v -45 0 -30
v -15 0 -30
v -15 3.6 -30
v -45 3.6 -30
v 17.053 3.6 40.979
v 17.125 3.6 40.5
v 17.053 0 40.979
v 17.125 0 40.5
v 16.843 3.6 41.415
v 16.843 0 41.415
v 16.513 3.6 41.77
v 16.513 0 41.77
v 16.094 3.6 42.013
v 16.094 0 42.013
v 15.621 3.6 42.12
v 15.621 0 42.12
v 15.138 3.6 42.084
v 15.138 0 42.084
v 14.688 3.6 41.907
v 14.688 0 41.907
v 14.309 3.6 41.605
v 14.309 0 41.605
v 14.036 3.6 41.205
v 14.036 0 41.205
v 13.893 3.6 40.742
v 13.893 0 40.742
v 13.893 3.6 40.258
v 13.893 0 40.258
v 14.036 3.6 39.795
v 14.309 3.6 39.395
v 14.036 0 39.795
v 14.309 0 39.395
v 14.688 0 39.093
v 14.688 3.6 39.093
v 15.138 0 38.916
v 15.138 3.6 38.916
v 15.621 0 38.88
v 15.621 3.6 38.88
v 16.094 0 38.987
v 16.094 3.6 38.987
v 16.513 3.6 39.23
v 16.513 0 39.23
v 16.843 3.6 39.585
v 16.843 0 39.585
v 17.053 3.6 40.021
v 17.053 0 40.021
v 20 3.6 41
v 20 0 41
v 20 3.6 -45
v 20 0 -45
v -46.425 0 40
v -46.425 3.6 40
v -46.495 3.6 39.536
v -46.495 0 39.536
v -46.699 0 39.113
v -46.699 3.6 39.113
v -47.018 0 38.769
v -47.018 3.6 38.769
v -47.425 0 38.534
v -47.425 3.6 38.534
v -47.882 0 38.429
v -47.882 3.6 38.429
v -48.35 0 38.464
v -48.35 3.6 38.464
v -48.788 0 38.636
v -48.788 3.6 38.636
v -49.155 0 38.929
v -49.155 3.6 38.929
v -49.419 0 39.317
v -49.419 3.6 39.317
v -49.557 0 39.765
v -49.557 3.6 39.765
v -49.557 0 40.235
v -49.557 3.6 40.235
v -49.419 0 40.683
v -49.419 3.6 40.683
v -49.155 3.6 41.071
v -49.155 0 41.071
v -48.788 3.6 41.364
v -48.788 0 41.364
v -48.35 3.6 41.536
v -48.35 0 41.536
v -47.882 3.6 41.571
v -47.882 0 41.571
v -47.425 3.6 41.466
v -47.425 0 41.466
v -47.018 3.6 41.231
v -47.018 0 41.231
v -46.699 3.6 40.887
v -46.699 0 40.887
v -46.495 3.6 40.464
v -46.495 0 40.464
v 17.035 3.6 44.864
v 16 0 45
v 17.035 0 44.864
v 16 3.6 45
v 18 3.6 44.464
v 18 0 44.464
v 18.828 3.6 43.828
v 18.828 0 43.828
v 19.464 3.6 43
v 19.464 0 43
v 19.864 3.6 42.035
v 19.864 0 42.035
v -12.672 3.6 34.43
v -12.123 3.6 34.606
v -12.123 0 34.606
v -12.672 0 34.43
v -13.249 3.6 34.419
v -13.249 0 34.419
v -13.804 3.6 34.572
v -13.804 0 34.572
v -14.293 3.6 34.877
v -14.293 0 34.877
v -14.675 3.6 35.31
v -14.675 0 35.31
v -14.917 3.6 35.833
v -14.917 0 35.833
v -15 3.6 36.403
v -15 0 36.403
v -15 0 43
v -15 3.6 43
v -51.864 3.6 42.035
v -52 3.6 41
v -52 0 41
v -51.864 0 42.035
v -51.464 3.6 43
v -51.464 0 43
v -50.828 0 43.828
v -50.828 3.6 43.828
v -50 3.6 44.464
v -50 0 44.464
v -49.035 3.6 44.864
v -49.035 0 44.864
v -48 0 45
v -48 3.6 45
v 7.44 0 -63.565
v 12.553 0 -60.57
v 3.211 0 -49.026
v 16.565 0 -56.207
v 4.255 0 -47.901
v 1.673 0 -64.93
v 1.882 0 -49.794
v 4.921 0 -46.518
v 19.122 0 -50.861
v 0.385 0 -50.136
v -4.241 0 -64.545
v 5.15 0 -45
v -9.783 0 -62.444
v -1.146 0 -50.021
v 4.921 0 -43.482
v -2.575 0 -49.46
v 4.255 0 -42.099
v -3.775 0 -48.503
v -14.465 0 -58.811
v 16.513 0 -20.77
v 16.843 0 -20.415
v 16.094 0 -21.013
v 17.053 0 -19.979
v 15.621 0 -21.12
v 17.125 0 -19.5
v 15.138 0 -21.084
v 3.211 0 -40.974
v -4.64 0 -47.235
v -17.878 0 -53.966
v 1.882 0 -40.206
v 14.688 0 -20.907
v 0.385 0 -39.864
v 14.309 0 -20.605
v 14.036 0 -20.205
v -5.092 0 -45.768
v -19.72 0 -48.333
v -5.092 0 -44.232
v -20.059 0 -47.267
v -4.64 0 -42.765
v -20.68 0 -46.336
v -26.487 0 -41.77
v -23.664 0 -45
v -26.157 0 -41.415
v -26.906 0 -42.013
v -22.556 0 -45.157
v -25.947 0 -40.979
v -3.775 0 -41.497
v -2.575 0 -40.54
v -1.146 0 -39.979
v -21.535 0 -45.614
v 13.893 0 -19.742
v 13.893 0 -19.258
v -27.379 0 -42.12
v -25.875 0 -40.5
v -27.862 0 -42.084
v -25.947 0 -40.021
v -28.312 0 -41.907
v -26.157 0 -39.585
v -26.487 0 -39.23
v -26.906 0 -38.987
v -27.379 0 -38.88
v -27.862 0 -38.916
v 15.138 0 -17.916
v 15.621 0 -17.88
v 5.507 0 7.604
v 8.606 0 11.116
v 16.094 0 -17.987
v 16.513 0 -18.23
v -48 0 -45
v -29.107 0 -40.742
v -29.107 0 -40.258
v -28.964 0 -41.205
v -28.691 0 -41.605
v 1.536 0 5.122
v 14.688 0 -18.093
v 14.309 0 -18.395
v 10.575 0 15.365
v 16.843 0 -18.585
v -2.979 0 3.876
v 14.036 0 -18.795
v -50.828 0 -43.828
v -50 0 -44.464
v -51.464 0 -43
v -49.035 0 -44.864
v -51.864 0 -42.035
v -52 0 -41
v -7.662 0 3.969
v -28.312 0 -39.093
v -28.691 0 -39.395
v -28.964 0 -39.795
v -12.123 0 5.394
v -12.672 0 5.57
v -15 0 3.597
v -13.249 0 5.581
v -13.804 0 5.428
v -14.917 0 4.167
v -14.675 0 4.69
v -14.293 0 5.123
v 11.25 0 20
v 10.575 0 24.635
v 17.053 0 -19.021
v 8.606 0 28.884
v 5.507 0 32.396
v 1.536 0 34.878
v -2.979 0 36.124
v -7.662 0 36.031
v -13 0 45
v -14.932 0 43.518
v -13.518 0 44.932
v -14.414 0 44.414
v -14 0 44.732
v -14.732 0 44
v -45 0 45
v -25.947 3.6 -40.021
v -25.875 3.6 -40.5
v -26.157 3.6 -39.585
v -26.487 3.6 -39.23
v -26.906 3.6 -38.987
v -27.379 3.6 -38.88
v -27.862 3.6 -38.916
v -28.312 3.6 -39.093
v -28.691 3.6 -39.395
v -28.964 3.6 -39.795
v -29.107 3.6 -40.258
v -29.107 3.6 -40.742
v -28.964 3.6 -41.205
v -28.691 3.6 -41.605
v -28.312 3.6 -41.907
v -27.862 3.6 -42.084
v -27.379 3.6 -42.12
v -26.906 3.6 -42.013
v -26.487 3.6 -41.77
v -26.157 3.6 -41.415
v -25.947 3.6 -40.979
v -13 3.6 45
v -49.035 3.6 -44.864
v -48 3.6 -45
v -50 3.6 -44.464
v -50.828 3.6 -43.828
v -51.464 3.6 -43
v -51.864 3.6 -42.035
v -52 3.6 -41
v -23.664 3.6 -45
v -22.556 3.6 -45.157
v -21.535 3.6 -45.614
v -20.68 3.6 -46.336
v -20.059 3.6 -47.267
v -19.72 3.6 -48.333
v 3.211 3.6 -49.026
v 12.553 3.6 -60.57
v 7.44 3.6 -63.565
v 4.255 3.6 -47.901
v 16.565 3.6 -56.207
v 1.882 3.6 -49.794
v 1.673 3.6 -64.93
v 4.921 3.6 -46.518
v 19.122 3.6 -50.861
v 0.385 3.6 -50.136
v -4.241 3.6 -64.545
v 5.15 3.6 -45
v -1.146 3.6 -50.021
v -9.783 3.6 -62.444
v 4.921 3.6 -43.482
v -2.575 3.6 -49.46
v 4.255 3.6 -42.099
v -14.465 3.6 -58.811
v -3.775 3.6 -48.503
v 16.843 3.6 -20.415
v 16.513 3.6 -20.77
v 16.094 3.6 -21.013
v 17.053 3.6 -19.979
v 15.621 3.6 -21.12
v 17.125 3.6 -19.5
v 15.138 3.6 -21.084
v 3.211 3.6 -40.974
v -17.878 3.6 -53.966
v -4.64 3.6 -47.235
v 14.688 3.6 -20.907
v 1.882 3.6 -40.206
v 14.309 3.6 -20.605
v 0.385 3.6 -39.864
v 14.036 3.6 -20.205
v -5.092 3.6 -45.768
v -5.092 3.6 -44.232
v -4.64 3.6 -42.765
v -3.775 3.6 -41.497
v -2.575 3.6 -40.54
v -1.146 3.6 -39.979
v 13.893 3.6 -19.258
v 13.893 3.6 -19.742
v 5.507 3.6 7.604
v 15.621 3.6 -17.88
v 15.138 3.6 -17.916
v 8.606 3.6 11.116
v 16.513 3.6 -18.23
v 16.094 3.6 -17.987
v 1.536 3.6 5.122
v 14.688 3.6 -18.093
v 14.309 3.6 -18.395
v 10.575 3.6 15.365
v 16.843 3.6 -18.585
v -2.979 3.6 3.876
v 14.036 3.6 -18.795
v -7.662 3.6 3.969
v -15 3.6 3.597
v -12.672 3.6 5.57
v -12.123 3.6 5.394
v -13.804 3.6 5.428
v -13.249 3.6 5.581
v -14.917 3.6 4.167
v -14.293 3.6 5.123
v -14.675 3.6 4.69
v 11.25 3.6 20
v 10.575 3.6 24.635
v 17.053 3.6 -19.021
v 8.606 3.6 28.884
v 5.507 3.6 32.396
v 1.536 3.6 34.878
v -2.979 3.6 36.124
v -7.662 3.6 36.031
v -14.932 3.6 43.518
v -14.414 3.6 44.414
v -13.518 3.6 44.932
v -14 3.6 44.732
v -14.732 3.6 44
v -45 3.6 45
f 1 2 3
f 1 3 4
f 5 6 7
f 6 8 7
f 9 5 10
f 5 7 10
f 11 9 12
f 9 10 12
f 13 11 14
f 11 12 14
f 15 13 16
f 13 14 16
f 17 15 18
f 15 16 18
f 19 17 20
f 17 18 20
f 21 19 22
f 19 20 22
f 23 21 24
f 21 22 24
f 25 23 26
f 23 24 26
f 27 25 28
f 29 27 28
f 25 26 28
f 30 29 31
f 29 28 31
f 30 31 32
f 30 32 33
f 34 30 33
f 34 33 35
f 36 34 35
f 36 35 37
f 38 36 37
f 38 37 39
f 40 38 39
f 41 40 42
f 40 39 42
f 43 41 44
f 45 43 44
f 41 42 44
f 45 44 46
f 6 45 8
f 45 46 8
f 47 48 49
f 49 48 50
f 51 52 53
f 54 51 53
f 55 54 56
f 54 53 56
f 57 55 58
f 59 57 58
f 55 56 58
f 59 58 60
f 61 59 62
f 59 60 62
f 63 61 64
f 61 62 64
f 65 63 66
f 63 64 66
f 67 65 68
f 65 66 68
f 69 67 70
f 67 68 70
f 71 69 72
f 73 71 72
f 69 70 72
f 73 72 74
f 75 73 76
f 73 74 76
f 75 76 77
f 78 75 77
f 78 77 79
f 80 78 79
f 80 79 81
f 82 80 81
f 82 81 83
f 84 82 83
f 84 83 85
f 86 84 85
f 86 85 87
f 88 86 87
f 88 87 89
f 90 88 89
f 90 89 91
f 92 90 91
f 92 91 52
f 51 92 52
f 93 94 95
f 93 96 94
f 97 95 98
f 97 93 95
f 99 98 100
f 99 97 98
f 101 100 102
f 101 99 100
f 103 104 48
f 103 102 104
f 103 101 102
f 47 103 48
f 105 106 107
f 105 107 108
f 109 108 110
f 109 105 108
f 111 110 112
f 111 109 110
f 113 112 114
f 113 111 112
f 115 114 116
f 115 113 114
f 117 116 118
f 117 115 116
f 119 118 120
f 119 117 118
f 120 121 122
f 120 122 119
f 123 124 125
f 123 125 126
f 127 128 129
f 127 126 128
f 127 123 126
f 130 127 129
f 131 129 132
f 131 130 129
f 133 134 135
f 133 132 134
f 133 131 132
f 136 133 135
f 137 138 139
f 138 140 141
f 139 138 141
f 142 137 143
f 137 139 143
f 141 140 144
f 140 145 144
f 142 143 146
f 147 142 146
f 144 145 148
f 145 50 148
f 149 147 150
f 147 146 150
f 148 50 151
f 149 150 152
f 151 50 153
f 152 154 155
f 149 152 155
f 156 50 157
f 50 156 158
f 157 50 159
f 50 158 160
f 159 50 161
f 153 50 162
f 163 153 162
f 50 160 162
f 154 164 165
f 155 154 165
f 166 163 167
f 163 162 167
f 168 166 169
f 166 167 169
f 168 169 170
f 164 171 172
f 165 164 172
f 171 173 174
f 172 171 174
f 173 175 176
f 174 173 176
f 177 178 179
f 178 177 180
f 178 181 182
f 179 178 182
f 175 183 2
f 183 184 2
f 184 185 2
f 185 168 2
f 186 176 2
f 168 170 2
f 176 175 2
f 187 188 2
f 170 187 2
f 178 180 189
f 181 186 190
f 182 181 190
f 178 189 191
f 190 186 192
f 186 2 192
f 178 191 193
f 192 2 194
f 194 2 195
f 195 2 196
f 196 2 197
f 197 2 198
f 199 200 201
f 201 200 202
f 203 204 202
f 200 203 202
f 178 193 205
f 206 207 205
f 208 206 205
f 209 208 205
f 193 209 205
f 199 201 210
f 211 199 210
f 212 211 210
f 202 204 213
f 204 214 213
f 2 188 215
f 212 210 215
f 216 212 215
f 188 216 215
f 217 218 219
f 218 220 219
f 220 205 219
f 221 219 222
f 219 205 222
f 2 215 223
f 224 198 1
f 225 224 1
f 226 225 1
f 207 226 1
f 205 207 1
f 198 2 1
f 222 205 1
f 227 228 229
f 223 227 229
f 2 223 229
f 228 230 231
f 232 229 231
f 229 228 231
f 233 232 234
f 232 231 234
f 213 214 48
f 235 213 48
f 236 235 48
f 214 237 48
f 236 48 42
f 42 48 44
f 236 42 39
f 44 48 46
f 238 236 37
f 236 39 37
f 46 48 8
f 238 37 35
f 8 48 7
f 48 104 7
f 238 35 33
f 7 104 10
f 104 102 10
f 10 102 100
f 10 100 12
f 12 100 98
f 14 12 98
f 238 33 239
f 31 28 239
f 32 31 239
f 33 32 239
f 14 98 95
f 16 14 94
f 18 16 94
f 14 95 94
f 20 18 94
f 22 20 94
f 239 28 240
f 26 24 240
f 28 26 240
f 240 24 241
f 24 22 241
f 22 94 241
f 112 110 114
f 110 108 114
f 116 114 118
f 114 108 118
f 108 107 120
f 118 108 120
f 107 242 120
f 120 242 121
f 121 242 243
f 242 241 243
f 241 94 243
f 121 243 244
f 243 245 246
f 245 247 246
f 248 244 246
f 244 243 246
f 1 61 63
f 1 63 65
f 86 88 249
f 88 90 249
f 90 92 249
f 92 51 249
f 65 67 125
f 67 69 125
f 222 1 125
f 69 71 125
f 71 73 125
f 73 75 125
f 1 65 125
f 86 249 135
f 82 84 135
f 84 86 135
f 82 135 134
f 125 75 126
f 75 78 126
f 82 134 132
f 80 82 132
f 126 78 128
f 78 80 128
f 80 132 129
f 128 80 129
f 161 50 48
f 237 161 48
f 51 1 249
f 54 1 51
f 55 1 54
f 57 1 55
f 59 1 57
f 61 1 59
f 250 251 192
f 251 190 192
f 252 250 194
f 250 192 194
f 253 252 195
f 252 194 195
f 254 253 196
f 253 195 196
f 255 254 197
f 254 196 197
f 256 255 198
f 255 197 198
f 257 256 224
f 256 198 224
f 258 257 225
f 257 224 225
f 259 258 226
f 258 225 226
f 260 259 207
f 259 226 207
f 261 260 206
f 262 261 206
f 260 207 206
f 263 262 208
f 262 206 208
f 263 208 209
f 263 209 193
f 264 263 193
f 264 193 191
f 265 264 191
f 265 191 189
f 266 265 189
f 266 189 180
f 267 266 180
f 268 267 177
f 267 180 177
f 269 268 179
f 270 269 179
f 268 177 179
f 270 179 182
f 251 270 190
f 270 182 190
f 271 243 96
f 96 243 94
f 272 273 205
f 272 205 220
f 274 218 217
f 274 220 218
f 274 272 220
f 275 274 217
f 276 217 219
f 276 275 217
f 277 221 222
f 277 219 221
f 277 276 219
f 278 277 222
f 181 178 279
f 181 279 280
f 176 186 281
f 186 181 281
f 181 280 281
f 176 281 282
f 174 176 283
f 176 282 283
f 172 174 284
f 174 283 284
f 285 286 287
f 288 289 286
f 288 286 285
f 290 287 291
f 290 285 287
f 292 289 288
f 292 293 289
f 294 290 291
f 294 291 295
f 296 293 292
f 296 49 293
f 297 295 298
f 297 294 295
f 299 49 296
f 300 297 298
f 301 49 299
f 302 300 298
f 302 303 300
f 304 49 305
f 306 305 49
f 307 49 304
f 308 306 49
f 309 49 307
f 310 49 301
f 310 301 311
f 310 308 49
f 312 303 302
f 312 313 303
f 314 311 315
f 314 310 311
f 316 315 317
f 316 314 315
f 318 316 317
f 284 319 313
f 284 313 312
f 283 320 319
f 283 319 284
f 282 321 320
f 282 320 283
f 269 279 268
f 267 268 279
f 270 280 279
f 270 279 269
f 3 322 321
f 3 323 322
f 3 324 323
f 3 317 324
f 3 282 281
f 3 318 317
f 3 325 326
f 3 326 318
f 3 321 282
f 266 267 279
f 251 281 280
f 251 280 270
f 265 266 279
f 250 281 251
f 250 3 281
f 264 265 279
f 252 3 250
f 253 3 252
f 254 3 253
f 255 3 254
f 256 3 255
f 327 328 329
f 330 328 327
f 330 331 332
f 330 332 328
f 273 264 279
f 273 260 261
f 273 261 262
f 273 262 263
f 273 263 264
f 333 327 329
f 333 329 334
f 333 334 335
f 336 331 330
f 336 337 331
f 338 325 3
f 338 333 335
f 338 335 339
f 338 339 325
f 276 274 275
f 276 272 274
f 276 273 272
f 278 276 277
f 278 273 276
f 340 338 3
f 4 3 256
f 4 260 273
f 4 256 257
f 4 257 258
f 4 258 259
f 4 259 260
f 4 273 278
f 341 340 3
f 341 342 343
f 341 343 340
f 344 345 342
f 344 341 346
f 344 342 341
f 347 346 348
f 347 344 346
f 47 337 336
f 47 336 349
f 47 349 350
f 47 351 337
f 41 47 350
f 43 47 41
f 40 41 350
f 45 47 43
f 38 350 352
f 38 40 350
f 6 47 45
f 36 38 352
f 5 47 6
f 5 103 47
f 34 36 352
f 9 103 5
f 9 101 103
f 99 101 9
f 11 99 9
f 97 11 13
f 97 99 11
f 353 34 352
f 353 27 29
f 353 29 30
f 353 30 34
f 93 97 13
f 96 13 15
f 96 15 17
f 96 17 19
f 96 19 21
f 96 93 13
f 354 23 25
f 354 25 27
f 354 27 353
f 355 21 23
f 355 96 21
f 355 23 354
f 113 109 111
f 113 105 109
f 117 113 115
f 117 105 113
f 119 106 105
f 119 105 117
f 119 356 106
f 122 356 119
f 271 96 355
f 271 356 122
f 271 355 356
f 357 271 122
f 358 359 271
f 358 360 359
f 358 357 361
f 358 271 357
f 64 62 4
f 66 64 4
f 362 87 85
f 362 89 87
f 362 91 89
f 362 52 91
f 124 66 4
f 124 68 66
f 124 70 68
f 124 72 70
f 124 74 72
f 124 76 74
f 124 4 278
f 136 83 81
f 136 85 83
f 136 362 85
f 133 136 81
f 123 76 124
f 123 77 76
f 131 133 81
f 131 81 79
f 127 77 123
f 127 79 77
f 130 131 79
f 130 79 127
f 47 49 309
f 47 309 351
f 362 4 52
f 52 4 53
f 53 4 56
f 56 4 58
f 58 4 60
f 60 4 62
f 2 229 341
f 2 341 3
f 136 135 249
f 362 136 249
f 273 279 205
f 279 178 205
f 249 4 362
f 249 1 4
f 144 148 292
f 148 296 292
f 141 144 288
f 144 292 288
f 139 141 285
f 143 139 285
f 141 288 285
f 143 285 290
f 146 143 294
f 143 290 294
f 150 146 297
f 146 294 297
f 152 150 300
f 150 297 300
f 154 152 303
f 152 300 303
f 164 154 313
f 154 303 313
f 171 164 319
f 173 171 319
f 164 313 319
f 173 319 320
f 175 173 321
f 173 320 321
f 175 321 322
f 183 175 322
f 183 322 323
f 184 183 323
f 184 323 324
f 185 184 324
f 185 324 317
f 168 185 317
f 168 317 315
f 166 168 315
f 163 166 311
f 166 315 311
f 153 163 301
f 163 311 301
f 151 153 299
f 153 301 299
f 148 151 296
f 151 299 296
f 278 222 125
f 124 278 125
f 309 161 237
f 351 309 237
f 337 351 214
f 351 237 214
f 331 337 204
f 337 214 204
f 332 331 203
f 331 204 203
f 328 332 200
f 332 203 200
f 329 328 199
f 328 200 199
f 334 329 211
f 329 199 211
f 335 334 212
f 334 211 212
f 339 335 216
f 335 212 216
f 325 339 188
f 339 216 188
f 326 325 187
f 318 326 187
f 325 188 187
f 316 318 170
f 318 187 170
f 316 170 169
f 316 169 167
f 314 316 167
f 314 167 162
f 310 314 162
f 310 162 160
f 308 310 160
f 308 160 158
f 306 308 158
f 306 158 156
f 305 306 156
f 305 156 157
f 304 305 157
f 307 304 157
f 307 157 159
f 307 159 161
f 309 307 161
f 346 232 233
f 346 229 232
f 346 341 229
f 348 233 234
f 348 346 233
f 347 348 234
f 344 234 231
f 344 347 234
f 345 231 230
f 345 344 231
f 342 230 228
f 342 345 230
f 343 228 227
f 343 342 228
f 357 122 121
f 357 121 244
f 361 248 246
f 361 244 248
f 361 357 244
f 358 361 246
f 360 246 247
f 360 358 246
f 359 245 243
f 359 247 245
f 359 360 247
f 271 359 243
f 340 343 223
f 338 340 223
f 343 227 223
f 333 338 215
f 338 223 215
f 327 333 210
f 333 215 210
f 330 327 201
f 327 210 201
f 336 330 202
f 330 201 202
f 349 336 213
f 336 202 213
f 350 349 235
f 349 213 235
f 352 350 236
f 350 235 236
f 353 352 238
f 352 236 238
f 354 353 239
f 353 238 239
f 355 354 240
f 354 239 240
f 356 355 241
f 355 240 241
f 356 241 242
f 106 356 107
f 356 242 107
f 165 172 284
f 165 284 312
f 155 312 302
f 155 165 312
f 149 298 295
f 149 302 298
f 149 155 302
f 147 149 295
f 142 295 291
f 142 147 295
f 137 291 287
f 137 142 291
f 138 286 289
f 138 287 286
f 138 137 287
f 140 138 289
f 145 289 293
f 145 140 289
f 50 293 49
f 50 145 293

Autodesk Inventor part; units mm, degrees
ref_plane "YZ Plane" through (0, 0, 0) normal (1, 0, 0) x (0, 1, 0)
ref_plane "XZ Plane" through (0, 0, 0) normal (0, 1, 0) x (-1, 0, 0)
ref_plane "XY Plane" through (0, 0, 0) normal (0, 0, 1) x (1, 0, 0)
sketch "Sketch1" plane through (0, 0, 0) normal (0, 1, 0) x (-1, 0, 0)
  line L0 (20, 45) -> (-20, 45)
  line L1 (-20, 45) -> (-20, -45)
  line L2 (-20, -45) -> (20, -45)
  line L3 (20, -45) -> (20, 45)
  line L4 (20, 45) -> (-20, -45) construction
  line L5 (-20, 45) -> (20, -45) construction
  arc A0 (-20, -45) -> (20, -45) centre (0, -45) ccw
  line L6 (20, -45) -> (52, -45)
  line L7 (52, -45) -> (52, 45)
  line L8 (52, 45) -> (20, 45)
  line L9 (20, 45) -> (20, -45)
  point P0 (0, 0)
  dimension "d0" = 40
  dimension "d1" = 90
  dimension "d7" = 32
  dimension "d8" = 90
extrude "Extrusion1" add sketch "Sketch1" along normal blind 3.6
sketch "Sketch2" plane through (0, 3.6, 0) normal (0, 1, 0) x (1, 0, 0)
  arc A0 (20, 45) -> (-20, 45) centre (0, 45) ccw projected
  circle A1 centre (0, 45) radius 5.15
  point P0 (0, 0)
  dimension "d4" = 10.3
extrude "Extrusion2" cut sketch "Sketch2" against normal blind 3.6
fillet "Fillet1" radius 4 4 edges at (-20, 1.8, -45) (-52, 1.8, -45) (-52, 1.8, 45) (20, 1.8, 45)
sketch "Sketch3" plane through (0, 0, 0) normal (0, -1, 0) x (1, 0, 0)
  line L0 (-48, 45) -> (16, 45) projected
  line L1 (-45, 45) -> (-15, 45)
  line L2 (-15, 45) -> (-15, -30)
  line L3 (-15, -30) -> (-45, -30)
  line L4 (-45, -30) -> (-45, 45)
  line L5 (-52, -41) -> (-52, 41) projected
  circle A0 centre (-5, 20) radius 16.25
  line L6 (20, 41) -> (20, -45) projected
  point P0 (0, 0)
  dimension "d10" = 30
  dimension "d11" = 75
  dimension "d12" = 7
  dimension "d13" = 32.5
  dimension "d14" = 25
  dimension "d15" = 25
extrude "Extrusion3" cut sketch "Sketch3" against normal blind 10
fillet "Fillet2" radius 2 3 edges at (-15, 1.8, 45) (-15, 1.8, 32.8087) (-15, 1.8, 7.1913)
sketch "Sketch4" plane through (0, 0, 0) normal (0, -1, 0) x (1, 0, 0)
  circle A0 centre (-27.5, -40.5) radius 1.625
  circle A1 centre (15.5, 40.5) radius 1.625
  circle A2 centre (15.5, -19.5) radius 1.625
  line L0 (20, 41) -> (20, -45) projected
  line L1 (-13, 45) -> (16, 45) projected
  line L2 (-23.6643, -45) -> (-48, -45) projected
  line L3 (-52, -41) -> (-52, 41) projected
  point P0 (0, 0)
  dimension "d19" = 3.25
  dimension "d20" = 3.25
  dimension "d21" = 3.25
  dimension "d22" = 4.5
  dimension "d23" = 4.5
  dimension "d24" = 4.5
  dimension "d25" = 60
  dimension "d26" = 4.5
  dimension "d27" = 24.5
extrude "Extrusion4" cut sketch "Sketch4" against normal blind 10
sketch "Sketch5" plane through (0, 3.6, 0) normal (0, 1, 0) x (1, 0, 0)
  circle A0 centre (-48, -40) radius 1.575
  line L0 (-52, 41) -> (-52, -41) projected
  line L1 (-13, -45) -> (16, -45) projected
  point P0 (0, 0)
  dimension "d30" = 3.15
  dimension "d31" = 4
  dimension "d32" = 5
extrude "Extrusion5" cut sketch "Sketch5" against normal blind 10
properties part number "p1"
